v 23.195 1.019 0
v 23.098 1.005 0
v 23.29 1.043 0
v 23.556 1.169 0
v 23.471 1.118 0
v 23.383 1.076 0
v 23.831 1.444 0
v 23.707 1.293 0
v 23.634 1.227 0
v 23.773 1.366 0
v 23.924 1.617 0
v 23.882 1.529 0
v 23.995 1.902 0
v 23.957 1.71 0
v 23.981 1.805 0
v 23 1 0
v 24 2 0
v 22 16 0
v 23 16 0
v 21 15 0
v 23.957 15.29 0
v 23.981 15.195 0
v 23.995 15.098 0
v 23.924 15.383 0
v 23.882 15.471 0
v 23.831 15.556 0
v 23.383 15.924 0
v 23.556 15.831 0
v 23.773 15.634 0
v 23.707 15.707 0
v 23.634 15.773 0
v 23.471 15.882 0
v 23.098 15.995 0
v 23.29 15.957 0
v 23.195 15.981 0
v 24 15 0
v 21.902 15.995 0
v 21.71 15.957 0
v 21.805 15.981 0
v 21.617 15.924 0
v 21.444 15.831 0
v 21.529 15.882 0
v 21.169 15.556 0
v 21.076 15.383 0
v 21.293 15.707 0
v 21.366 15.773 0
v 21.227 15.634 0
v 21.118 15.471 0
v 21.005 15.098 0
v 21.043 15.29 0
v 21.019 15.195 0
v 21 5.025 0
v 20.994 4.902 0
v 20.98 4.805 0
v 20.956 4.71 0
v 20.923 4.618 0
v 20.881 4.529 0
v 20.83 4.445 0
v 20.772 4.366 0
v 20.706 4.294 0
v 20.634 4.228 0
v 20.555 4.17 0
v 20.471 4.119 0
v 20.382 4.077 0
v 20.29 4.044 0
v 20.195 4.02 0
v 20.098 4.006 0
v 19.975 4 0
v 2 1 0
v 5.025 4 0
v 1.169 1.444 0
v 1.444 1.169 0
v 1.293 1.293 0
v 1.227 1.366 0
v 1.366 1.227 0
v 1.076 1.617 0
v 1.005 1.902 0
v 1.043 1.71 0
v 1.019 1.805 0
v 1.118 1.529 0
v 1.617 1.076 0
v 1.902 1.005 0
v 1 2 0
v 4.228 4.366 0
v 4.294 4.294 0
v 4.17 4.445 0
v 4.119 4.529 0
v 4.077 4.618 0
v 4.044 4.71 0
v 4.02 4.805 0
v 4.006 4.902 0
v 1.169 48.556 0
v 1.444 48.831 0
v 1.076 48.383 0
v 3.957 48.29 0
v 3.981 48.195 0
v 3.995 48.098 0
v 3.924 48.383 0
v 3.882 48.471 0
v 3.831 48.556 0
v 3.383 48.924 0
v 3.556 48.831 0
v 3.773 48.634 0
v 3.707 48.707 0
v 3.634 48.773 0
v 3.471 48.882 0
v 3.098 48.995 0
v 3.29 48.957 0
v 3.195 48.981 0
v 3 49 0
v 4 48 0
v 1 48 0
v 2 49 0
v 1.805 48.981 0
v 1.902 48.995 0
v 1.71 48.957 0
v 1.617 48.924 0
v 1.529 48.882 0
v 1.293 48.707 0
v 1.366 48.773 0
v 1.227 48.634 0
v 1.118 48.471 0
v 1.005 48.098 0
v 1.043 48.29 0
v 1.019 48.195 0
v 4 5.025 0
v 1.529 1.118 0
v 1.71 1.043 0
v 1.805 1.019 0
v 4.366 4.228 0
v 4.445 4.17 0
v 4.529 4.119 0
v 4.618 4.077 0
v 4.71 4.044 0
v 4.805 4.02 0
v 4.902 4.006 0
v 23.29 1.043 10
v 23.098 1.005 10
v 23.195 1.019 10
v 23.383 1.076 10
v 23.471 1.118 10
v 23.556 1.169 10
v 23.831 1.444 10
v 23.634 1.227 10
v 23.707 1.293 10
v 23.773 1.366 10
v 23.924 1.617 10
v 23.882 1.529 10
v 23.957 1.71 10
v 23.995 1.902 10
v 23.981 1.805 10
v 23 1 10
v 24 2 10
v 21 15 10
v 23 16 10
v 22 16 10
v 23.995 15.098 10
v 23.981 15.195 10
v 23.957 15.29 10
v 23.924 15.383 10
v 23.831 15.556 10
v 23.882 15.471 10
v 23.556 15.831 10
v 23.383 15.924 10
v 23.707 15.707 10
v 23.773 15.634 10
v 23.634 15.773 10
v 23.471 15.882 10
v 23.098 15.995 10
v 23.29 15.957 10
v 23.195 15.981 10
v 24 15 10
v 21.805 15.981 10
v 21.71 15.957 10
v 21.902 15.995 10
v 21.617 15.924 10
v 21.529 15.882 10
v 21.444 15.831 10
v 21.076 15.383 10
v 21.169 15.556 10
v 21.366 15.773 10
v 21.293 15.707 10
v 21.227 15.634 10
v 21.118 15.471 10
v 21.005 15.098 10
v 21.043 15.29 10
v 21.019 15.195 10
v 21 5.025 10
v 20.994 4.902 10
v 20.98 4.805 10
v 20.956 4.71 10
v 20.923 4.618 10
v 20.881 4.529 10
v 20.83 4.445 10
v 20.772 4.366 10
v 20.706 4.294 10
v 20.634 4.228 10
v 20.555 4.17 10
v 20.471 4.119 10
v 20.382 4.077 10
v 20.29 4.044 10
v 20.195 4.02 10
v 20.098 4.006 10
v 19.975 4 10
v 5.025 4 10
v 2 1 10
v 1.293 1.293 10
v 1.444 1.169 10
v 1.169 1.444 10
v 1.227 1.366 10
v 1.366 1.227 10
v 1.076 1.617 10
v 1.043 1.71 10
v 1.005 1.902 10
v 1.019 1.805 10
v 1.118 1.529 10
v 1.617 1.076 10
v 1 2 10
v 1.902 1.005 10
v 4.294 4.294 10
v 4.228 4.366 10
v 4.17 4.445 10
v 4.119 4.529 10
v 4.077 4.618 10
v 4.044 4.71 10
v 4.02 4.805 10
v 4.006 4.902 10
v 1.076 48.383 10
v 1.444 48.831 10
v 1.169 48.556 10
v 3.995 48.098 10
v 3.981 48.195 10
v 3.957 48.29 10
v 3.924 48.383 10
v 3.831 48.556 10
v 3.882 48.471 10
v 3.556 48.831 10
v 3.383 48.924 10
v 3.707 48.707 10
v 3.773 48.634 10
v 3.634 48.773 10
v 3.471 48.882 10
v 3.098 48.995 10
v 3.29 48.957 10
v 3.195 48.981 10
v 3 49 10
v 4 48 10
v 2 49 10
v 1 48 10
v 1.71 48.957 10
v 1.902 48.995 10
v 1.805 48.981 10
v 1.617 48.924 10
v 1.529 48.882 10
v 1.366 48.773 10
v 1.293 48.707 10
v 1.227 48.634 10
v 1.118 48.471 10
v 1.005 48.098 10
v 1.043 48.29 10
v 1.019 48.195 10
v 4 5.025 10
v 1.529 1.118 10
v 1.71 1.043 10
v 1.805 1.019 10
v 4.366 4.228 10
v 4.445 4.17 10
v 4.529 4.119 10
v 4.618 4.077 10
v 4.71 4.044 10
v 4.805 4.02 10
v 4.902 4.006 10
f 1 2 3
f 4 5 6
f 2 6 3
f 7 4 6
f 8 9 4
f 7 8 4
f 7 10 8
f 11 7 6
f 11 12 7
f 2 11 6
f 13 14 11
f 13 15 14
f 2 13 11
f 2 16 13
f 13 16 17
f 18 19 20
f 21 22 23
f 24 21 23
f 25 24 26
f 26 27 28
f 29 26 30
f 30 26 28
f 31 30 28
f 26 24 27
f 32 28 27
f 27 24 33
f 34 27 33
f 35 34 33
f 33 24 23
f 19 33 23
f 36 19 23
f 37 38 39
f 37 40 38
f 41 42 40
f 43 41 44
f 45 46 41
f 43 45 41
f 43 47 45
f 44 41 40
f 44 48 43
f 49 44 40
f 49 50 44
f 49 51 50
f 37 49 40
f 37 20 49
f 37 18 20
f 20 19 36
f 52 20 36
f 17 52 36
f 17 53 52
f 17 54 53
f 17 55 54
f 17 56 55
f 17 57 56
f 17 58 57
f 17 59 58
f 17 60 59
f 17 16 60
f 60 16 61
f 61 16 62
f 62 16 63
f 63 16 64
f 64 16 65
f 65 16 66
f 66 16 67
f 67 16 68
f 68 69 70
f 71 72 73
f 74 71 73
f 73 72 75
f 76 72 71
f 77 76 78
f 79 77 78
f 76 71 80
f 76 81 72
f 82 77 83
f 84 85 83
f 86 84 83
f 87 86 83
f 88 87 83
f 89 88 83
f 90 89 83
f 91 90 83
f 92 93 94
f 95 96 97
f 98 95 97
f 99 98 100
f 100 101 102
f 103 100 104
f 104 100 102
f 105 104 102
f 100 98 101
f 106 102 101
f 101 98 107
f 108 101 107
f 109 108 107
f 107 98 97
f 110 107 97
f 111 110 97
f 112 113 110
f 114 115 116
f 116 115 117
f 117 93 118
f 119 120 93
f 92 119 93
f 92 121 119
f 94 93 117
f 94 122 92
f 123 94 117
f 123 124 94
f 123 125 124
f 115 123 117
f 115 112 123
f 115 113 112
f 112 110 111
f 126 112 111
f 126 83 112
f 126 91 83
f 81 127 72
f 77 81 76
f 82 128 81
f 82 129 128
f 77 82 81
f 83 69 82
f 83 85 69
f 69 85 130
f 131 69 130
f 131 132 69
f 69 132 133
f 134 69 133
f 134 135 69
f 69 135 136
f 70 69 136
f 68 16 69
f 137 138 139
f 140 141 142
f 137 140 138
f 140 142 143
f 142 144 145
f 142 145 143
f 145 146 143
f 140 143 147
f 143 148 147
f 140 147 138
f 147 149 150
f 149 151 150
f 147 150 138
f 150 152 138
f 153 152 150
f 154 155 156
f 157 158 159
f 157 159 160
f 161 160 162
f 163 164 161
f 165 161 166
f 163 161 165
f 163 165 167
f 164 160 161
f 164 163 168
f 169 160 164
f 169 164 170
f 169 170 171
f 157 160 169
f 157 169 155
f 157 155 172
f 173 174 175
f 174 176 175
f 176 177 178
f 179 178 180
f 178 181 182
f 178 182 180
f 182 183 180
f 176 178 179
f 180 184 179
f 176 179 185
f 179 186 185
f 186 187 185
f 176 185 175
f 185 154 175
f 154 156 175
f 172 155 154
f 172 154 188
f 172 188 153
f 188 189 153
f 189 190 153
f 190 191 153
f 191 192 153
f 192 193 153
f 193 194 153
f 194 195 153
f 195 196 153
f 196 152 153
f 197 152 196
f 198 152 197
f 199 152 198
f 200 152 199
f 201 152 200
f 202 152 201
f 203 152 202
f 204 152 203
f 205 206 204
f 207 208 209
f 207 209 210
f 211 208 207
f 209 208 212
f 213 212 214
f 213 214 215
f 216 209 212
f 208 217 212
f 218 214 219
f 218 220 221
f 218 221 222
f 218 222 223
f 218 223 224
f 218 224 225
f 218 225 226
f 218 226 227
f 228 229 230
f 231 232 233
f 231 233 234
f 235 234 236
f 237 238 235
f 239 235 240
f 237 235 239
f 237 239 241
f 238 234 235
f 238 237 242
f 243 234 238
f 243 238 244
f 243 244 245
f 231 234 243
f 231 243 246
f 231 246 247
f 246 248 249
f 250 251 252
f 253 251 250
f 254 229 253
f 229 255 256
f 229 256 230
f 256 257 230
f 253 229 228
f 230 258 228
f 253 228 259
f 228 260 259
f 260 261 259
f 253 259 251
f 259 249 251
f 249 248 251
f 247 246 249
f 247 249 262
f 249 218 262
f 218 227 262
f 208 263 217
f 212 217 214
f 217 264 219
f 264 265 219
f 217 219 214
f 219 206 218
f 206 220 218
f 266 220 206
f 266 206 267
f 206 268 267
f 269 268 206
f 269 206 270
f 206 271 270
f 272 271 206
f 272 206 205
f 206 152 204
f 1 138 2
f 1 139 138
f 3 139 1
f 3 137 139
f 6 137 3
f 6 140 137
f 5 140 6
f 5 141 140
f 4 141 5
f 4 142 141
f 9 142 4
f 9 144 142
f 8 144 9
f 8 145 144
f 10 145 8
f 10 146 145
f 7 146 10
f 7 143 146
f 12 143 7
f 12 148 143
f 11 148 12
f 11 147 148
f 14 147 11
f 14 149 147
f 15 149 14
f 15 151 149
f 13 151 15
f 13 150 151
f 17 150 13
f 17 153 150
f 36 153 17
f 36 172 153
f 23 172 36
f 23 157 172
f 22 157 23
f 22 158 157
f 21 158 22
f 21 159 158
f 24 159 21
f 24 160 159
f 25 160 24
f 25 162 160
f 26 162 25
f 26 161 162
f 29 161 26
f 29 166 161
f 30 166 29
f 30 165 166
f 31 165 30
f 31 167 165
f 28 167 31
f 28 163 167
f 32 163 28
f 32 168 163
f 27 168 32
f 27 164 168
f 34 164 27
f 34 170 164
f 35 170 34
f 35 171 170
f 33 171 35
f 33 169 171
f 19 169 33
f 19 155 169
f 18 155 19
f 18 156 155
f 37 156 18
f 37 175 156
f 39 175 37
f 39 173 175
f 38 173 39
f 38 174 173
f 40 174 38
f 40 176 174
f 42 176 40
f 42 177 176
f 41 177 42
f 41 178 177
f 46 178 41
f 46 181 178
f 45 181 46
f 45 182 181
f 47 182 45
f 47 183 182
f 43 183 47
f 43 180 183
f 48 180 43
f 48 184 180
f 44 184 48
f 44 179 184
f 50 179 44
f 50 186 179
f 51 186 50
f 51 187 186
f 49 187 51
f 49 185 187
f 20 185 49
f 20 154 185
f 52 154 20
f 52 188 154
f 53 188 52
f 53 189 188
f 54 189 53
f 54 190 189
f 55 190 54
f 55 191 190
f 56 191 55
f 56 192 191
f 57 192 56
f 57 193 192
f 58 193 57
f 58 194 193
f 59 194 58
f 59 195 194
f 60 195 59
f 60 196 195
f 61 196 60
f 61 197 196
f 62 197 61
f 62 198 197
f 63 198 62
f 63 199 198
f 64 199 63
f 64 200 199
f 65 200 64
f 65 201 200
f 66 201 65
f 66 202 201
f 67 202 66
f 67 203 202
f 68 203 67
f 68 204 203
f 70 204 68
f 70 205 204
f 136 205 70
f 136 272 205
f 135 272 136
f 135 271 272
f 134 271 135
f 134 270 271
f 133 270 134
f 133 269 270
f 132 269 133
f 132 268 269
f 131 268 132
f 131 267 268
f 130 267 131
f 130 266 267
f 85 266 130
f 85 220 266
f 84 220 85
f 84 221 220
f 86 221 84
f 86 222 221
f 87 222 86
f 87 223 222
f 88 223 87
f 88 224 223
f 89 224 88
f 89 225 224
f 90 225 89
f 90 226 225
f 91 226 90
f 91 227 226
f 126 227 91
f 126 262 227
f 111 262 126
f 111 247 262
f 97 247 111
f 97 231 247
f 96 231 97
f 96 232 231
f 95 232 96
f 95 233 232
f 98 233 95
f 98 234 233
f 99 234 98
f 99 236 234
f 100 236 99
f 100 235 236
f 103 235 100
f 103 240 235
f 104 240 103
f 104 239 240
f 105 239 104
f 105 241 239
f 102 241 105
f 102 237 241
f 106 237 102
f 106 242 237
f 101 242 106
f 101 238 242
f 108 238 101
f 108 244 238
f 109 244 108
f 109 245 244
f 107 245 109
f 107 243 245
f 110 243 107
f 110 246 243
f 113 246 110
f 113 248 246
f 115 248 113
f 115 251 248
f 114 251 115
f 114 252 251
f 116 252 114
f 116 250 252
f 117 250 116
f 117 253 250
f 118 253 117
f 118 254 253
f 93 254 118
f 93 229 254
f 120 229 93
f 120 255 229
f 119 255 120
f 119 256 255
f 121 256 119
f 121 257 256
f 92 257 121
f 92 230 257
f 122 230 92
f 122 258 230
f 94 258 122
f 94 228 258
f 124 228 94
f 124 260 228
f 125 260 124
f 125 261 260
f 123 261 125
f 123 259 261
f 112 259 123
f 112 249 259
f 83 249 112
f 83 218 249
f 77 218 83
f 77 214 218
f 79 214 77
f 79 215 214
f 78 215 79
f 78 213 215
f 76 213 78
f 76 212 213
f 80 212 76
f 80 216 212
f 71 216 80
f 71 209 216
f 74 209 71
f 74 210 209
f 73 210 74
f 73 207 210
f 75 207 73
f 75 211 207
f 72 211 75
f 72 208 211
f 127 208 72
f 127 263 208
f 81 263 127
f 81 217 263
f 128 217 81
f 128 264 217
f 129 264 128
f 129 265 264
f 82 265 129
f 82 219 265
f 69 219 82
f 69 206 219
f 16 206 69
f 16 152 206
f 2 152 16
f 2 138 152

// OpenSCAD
Q=2;
K=3.0+Q;
BACK_IN=10;        
H=10;


Z1=50;
X=20;
Z2=17;


module l() {
square([K,Z1]);
square([X,K]);
translate([X,0])
square([K,Z2]);
}


linear_extrude(H)
offset(Q/2,$fn=64)
offset(-Q)
l();
